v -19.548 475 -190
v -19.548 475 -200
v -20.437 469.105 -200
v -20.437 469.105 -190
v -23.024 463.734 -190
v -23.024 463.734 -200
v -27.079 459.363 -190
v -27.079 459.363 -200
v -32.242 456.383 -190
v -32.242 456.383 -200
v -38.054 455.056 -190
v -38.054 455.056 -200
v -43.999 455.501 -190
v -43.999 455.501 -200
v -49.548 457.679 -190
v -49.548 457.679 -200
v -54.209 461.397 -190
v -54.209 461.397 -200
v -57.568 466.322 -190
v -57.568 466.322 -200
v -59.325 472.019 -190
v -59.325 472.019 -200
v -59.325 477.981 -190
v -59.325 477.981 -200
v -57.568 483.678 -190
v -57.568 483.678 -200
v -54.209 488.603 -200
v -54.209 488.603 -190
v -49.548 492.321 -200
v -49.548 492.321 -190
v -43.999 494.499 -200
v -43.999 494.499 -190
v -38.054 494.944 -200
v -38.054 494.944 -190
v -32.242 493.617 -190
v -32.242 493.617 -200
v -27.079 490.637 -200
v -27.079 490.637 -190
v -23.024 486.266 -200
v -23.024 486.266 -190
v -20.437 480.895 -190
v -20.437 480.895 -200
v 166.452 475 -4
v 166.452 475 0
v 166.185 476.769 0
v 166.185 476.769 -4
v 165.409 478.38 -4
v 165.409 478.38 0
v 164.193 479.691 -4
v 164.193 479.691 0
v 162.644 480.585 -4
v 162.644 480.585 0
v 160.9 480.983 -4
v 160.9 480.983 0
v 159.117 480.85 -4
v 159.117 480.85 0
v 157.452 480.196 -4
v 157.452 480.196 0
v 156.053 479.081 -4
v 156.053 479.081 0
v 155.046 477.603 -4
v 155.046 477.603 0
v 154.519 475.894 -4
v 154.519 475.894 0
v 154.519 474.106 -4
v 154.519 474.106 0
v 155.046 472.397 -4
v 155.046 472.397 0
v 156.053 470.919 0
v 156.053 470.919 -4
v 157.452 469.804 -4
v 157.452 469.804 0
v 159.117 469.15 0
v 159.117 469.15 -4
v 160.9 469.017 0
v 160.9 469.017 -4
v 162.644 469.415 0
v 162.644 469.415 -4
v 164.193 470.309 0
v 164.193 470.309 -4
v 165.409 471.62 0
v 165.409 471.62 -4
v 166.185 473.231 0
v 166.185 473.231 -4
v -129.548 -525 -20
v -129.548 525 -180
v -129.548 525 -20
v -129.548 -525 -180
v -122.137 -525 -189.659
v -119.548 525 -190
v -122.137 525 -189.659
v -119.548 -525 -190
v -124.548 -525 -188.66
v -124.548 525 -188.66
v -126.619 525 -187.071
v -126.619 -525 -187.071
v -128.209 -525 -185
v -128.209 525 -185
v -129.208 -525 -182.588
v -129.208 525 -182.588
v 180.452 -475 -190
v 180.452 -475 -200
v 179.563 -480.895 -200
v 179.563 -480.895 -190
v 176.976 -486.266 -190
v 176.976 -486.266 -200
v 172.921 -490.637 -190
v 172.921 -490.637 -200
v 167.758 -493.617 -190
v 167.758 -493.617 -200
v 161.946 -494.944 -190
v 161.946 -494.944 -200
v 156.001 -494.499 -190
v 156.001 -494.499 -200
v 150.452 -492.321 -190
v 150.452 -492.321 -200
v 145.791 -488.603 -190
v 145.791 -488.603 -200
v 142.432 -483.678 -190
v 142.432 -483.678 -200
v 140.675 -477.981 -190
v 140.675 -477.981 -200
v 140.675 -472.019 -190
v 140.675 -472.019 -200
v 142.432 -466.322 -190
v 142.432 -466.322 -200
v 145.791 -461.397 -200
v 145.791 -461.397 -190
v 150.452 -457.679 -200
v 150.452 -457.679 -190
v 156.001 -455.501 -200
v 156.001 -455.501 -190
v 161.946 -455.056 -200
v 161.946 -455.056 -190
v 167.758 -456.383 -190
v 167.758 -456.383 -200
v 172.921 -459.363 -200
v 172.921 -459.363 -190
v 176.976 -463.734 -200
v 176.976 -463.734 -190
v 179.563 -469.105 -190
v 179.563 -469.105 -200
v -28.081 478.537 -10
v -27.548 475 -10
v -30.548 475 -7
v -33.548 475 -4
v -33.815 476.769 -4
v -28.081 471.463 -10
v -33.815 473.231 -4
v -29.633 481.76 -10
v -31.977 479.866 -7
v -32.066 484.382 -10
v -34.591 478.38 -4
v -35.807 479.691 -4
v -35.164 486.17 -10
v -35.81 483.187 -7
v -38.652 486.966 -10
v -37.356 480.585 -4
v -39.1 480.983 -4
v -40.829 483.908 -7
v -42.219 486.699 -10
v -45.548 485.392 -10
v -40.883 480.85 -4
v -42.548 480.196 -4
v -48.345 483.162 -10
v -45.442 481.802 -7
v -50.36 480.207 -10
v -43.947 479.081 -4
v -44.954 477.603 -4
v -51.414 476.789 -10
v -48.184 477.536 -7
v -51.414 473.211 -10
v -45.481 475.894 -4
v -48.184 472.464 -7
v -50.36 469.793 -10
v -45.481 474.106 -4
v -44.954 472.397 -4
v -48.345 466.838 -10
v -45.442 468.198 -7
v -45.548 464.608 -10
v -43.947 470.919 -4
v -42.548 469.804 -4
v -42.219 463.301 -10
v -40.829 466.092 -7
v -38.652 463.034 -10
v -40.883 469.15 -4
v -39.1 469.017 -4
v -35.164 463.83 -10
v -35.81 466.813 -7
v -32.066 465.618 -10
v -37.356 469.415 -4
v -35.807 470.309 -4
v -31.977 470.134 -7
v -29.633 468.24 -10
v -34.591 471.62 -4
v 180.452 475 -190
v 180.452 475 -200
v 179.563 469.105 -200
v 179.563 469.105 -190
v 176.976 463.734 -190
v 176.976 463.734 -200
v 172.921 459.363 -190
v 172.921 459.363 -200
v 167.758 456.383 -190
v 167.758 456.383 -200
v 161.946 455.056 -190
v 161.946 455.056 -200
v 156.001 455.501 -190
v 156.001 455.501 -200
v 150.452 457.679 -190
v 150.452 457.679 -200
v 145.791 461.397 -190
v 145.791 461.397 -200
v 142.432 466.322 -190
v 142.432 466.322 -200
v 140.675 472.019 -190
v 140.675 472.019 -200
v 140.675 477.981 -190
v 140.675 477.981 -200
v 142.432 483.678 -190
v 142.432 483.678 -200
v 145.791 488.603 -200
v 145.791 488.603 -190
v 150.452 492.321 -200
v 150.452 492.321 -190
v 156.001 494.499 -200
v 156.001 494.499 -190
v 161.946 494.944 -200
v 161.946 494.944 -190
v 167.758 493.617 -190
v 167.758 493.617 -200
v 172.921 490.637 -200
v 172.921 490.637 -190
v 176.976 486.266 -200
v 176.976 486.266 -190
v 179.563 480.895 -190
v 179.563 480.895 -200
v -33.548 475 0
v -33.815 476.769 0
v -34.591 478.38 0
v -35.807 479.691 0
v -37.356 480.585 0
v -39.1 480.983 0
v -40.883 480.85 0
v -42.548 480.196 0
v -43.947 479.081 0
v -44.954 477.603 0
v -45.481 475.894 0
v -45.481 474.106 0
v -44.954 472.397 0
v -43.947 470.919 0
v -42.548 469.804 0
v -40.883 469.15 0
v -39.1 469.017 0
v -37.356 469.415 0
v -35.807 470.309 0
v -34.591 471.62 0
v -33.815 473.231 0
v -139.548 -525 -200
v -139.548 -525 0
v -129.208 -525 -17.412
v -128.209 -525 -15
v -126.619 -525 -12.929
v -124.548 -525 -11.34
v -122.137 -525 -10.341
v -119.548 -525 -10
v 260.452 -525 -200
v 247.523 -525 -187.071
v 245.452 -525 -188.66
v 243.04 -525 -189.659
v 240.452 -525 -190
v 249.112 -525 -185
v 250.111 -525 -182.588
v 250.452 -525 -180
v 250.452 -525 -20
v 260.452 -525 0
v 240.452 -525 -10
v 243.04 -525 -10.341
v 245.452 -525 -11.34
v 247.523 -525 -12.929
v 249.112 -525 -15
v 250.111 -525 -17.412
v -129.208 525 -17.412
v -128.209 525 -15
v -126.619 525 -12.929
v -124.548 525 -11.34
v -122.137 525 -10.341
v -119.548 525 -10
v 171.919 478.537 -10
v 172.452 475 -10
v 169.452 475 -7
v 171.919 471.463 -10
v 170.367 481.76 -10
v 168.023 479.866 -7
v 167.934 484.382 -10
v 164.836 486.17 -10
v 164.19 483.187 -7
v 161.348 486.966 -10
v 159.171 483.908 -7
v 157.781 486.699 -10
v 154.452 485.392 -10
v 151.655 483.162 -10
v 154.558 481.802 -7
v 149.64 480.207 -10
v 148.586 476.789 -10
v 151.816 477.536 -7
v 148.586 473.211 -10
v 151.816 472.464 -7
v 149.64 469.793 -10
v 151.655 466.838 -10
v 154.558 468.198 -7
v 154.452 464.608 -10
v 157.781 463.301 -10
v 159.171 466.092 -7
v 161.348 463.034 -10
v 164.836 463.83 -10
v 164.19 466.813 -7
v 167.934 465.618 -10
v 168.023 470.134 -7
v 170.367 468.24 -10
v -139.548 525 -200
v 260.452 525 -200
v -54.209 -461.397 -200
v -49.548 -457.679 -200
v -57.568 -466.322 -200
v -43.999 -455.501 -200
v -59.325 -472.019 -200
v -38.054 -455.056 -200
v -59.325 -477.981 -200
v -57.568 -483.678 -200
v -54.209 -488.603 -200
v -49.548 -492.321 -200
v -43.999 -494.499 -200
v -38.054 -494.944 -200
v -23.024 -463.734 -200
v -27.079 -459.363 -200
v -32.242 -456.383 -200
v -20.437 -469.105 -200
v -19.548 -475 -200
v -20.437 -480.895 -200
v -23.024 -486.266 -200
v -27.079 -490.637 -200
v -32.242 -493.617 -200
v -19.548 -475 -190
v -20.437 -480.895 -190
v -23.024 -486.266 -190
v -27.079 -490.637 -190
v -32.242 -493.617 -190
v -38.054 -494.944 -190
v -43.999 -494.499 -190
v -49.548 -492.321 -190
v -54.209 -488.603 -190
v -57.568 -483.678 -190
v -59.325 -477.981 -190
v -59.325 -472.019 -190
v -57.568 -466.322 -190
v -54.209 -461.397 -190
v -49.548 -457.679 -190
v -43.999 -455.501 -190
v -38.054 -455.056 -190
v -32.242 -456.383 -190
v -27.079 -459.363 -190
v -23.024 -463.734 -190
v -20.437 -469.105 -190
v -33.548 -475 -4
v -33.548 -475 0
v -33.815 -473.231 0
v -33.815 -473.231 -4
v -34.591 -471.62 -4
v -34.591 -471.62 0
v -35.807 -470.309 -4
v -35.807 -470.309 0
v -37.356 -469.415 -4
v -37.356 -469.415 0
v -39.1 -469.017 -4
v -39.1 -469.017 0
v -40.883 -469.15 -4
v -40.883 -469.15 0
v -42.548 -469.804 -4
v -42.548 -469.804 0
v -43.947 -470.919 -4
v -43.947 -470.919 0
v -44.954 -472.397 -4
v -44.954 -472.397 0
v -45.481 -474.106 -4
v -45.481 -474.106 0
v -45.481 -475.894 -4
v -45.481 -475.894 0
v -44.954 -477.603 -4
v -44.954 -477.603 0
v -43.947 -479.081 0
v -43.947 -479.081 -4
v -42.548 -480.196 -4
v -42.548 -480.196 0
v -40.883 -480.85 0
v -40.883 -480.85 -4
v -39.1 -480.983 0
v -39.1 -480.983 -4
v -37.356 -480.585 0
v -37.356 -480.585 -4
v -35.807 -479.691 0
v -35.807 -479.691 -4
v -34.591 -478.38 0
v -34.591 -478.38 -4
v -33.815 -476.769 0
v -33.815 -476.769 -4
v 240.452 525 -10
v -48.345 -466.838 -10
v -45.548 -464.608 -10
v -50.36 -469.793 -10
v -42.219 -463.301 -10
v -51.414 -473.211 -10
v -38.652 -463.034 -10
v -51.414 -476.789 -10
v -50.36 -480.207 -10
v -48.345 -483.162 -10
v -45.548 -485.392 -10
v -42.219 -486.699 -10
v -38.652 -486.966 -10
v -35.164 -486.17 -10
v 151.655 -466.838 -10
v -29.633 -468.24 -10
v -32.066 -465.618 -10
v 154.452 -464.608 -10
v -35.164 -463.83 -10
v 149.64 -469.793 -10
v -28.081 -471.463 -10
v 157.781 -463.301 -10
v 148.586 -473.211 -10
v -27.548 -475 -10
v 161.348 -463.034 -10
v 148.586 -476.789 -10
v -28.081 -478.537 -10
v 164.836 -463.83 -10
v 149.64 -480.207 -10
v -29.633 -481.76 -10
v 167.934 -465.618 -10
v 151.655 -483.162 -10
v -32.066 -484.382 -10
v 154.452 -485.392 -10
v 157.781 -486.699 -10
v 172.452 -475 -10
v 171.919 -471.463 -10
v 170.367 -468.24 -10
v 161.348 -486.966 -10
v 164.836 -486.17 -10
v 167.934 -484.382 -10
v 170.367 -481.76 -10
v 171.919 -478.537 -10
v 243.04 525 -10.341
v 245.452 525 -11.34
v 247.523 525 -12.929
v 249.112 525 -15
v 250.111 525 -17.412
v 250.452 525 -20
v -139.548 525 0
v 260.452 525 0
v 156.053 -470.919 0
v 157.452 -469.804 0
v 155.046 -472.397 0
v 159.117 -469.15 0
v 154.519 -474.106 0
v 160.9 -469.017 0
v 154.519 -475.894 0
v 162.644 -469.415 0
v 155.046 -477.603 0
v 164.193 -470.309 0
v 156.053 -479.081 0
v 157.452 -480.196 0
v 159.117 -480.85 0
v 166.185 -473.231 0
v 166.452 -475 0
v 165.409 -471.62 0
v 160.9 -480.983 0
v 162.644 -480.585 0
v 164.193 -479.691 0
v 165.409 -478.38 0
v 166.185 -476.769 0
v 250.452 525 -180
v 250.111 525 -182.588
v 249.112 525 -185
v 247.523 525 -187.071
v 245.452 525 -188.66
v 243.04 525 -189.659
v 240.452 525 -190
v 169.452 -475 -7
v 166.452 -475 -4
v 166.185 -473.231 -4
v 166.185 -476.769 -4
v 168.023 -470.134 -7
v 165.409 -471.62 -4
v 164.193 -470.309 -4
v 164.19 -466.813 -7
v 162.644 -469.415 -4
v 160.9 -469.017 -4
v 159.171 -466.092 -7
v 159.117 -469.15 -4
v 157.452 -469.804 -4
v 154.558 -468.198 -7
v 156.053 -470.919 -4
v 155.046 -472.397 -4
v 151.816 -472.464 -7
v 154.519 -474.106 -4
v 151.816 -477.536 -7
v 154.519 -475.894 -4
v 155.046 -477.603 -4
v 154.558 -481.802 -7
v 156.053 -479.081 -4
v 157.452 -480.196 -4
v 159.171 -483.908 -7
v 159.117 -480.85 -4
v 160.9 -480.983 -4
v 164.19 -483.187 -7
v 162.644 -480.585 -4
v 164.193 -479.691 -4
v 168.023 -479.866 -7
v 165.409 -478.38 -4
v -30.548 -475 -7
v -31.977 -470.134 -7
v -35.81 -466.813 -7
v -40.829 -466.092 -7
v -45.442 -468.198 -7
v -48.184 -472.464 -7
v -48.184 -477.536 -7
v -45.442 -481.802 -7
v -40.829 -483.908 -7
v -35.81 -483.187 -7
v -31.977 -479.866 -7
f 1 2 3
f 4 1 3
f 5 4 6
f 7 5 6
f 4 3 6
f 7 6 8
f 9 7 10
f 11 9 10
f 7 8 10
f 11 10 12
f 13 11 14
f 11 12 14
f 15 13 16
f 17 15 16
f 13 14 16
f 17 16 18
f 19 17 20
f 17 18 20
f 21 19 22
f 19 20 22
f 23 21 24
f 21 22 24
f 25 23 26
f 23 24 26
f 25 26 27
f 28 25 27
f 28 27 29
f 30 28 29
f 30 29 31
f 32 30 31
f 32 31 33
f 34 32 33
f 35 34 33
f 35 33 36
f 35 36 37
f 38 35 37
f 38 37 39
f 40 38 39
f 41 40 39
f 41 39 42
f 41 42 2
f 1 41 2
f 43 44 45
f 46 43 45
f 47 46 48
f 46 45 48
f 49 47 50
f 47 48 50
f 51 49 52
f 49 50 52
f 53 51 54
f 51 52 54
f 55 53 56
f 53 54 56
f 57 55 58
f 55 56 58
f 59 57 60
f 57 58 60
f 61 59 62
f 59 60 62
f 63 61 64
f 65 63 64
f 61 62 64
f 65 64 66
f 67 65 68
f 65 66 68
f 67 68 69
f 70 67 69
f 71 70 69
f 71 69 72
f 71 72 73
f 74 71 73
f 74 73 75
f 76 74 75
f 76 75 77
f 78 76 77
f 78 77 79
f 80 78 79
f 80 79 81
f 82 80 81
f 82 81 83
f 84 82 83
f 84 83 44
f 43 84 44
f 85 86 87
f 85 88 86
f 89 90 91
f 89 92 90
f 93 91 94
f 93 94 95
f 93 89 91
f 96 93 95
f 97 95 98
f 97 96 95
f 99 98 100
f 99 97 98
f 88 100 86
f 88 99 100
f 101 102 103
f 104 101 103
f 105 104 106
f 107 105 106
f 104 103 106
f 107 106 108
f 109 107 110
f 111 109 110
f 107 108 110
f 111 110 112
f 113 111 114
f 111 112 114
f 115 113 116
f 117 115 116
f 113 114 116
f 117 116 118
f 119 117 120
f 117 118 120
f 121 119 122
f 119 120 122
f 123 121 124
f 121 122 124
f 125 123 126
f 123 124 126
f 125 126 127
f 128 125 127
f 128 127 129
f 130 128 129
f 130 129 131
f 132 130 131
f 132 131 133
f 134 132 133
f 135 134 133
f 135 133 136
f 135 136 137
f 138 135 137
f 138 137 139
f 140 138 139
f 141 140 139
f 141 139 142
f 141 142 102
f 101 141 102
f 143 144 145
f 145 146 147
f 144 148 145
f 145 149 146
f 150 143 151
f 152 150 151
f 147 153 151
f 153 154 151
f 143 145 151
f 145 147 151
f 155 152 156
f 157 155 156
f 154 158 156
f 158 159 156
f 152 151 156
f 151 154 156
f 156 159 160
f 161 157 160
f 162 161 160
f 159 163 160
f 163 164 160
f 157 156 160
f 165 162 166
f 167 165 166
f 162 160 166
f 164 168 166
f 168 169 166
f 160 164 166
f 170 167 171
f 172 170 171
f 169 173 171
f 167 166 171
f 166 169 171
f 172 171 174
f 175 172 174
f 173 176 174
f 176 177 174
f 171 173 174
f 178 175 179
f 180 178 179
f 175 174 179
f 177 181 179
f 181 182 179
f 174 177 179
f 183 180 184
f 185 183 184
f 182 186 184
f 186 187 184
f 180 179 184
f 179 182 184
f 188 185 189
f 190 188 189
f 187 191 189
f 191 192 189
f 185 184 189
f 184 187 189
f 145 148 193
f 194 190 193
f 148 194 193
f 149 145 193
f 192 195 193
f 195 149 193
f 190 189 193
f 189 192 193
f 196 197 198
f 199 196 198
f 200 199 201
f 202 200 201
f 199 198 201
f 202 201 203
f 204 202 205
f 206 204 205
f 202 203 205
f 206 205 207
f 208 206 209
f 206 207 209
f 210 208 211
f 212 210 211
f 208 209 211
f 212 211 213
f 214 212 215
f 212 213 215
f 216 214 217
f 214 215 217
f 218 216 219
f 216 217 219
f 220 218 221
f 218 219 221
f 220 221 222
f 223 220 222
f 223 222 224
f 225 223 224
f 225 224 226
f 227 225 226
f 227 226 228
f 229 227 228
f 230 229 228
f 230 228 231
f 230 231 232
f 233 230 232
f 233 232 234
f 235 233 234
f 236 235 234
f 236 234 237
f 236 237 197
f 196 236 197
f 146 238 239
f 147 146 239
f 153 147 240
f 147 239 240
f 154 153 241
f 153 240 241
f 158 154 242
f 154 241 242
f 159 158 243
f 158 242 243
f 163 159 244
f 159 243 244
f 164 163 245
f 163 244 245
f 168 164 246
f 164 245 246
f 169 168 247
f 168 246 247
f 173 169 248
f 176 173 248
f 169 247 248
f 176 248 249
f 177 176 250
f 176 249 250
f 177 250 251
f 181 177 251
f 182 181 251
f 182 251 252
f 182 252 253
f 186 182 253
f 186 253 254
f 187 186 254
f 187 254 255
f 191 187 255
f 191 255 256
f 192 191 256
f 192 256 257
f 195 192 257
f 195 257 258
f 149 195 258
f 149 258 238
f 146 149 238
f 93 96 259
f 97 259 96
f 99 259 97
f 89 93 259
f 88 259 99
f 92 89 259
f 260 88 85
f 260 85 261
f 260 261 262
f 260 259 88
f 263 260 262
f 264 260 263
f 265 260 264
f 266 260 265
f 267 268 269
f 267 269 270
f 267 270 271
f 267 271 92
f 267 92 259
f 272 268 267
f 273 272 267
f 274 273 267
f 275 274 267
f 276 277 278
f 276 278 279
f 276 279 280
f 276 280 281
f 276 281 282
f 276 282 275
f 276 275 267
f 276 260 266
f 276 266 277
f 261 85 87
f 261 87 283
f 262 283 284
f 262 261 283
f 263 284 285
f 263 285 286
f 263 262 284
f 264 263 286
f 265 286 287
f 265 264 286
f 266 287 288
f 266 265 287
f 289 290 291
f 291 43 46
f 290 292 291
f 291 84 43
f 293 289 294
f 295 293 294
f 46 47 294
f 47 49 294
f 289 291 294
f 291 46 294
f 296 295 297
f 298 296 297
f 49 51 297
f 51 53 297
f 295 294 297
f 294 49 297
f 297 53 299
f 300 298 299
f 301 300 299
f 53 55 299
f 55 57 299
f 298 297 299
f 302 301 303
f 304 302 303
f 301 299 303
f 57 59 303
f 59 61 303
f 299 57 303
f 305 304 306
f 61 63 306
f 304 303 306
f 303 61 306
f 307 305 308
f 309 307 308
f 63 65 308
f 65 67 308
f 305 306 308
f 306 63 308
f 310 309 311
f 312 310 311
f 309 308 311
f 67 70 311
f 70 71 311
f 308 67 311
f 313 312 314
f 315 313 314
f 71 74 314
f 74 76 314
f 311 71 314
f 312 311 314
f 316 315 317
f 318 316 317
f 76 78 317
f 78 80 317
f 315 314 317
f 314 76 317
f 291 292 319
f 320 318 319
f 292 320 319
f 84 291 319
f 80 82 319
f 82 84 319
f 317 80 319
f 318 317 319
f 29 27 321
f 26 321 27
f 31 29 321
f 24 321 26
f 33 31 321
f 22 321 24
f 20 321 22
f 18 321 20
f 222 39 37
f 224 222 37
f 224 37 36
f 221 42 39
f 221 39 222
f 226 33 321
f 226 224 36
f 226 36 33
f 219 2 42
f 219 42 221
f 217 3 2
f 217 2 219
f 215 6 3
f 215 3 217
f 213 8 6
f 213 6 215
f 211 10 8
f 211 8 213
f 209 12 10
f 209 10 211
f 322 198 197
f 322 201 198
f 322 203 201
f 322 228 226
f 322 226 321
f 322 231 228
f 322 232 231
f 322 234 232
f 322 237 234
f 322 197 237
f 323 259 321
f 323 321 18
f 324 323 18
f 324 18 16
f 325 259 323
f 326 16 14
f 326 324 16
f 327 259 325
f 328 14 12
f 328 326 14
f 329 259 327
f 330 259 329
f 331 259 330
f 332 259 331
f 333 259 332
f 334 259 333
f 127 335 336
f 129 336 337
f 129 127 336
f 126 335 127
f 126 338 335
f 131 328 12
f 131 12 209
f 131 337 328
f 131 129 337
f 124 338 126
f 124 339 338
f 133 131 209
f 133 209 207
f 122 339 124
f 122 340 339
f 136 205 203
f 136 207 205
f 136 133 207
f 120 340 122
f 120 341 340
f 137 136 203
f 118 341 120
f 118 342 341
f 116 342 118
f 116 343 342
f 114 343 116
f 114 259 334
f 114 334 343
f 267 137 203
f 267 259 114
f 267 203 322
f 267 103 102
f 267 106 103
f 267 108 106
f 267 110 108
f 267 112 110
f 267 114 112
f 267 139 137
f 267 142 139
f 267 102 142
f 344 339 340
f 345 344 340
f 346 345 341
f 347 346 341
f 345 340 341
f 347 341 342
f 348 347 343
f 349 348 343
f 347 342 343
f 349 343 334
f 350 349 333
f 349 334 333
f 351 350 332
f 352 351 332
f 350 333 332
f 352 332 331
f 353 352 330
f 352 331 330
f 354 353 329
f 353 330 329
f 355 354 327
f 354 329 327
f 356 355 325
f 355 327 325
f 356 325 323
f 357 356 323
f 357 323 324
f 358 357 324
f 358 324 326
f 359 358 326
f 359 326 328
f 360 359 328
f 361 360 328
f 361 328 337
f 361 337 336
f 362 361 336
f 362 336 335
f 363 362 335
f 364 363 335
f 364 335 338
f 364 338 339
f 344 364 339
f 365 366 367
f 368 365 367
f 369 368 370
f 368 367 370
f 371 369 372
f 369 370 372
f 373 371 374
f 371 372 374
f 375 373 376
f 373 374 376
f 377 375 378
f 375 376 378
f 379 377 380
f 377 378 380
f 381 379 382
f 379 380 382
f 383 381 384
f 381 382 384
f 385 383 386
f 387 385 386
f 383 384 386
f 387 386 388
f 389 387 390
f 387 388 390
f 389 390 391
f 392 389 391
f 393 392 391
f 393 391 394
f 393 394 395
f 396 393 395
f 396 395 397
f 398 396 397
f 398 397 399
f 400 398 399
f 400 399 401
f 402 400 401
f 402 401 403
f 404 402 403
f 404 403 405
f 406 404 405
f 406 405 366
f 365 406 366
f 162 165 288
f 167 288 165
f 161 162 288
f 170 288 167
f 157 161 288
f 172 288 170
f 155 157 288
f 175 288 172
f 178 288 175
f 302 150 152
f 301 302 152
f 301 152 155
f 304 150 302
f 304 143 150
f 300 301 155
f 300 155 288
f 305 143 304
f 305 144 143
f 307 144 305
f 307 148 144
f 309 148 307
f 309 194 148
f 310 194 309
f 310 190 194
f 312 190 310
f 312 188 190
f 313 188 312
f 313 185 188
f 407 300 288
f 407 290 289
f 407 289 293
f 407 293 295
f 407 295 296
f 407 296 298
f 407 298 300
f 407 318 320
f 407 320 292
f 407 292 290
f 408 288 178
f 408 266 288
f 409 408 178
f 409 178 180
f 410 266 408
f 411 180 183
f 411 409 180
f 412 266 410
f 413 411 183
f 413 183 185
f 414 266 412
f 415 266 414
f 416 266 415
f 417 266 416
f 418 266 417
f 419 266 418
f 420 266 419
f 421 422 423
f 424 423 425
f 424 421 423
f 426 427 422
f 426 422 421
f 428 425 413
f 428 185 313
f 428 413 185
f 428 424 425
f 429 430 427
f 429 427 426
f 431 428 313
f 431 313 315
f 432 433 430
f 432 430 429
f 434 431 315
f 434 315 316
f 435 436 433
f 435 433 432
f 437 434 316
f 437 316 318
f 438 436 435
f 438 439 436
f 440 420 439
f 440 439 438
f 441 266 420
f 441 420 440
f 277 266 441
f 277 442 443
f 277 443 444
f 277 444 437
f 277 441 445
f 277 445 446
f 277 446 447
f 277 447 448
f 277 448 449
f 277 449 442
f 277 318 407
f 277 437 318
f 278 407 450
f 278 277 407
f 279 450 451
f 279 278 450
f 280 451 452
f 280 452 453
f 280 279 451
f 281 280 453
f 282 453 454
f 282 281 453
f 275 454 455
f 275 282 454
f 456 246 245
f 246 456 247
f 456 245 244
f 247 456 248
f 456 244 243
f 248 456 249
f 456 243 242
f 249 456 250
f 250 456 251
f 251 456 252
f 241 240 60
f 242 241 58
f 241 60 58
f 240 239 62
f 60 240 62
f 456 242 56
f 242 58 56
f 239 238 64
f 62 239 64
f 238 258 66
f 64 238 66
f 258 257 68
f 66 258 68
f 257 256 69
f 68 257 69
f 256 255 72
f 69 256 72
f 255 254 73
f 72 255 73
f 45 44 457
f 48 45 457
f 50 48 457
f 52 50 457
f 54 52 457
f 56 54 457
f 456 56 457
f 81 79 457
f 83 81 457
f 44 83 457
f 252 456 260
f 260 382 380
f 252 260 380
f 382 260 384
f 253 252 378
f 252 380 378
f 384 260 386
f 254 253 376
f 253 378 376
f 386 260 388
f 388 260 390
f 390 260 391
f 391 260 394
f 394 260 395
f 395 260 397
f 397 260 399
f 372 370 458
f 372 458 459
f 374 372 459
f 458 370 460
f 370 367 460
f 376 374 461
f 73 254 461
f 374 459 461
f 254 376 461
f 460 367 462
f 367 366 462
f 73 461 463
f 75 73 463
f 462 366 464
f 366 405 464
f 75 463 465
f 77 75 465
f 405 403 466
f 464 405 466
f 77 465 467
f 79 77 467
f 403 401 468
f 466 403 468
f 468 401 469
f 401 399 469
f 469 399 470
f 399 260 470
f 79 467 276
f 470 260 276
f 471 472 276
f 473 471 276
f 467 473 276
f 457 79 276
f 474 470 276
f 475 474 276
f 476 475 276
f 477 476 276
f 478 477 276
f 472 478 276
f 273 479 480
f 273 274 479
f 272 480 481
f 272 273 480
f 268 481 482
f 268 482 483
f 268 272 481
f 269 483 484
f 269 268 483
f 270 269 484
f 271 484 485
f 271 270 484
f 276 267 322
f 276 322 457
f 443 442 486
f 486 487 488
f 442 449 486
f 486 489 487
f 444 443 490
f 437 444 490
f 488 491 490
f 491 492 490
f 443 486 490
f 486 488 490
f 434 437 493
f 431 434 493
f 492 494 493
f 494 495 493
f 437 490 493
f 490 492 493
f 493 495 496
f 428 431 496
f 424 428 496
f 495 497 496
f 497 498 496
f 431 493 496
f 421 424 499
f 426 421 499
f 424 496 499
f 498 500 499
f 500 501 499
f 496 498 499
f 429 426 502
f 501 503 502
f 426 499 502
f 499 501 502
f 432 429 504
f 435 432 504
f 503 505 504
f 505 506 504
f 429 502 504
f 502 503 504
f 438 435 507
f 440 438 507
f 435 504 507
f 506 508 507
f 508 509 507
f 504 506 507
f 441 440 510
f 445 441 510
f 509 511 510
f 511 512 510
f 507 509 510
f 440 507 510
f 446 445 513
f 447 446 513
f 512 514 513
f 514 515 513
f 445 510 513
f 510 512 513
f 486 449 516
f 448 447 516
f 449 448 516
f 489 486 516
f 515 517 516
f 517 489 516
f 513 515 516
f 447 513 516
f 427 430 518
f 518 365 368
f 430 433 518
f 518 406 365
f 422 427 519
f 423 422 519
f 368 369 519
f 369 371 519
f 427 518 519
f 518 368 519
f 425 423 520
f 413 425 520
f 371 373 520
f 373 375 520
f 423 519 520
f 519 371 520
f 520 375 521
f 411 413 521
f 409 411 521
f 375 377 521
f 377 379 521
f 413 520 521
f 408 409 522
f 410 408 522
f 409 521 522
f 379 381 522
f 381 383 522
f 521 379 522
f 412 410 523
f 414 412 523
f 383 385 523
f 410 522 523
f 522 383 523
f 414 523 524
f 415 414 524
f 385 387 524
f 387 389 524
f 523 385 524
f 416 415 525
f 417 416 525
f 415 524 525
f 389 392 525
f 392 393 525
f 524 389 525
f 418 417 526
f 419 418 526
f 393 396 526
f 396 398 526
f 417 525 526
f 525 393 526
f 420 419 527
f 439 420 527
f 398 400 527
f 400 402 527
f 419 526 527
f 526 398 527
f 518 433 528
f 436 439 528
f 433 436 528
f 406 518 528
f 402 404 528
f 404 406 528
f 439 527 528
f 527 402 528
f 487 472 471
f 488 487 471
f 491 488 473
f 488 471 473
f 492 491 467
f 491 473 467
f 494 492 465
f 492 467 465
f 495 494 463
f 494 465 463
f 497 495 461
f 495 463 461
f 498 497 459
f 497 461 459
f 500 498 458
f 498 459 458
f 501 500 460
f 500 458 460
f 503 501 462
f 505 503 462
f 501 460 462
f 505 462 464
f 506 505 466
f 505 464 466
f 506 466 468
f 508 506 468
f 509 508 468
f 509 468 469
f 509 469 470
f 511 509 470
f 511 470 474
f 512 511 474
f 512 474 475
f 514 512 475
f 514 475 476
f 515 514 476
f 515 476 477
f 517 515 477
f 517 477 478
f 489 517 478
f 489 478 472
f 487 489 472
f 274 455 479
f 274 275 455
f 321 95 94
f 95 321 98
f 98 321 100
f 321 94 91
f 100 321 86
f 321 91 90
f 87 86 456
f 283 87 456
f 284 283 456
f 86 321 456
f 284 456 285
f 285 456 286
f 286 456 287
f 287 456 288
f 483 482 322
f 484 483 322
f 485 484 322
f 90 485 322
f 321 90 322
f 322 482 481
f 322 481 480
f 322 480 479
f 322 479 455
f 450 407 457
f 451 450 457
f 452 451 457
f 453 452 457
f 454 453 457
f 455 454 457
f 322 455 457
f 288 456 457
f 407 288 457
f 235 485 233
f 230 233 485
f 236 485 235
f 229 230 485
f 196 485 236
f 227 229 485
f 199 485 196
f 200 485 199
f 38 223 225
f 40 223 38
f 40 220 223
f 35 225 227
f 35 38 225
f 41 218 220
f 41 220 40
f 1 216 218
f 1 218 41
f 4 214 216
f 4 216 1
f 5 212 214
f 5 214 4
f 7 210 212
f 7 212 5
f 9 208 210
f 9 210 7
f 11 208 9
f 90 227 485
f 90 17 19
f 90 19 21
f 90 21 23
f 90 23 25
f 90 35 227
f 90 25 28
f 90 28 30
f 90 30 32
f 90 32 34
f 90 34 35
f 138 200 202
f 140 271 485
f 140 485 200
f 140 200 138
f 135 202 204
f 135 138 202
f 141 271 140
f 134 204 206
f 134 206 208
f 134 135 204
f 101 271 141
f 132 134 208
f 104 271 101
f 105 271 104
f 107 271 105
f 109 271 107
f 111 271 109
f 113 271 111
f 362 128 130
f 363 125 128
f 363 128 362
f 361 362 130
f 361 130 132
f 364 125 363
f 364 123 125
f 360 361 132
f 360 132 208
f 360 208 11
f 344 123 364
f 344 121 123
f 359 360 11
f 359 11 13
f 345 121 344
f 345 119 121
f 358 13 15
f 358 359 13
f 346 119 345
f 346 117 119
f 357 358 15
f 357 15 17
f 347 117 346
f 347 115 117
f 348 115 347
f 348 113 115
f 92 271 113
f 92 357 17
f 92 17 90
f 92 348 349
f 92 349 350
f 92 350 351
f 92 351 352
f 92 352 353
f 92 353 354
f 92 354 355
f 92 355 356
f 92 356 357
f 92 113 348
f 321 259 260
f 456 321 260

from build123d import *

# Parameters (mm, degrees)
F0_W     = 400
F0_H     = 200
F1_DEPTH = 525
F2_R     = 6
F3_DEPTH = 200.001
F4_R     = 20
F5_DEPTH = 25
F6_SIZE  = 6


with BuildPart() as f1:
    # F0 (on Front) → F1 (new body, symmetric)
    with BuildSketch(Plane.XZ):
        with Locations((60.4516596433, -100)):
            Rectangle(F0_W, F0_H)
        with BuildLine():
            ThreePointArc((-129.5483403567, -20), (-126.6194081686, -12.9289321881), (-119.5483403567, -10))
            Line((-119.5483403567, -10), (240.4516596433, -10))
            ThreePointArc((240.4516596433, -10), (247.5227274551, -12.9289321881), (250.4516596433, -20))
            Line((250.4516596433, -20), (250.4516596433, -180))
            ThreePointArc((250.4516596433, -180), (247.5227274551, -187.0710678119), (240.4516596433, -190))
            Line((240.4516596433, -190), (-119.5483403567, -190))
            ThreePointArc((-119.5483403567, -190), (-126.6194081686, -187.0710678119), (-129.5483403567, -180))
            Line((-129.5483403567, -180), (-129.5483403567, -20))
        make_face(mode=Mode.SUBTRACT)
    extrude(amount=F1_DEPTH, both=True)

    # F2 (on face) → F3 (cut, through all)
    with BuildSketch(Plane.XY):
        with Locations((-39.5483403567, -475)):
            Circle(F2_R)
        with Locations((160.4516596433, -475)):
            Circle(F2_R)
        with Locations((-39.5483403567, 475)):
            Circle(F2_R)
        with Locations((160.4516596433, 475)):
            Circle(F2_R)
    extrude(amount=-F3_DEPTH, mode=Mode.SUBTRACT)

    # F4 (on face) → F5 (cut)
    with BuildSketch(Plane(origin=(0, 0, -200), x_dir=(1, 0, 0), z_dir=(0, 0, -1))):
        with Locations((-39.5483403567, 475)):
            Circle(F4_R)
        with Locations((160.4516596433, 475)):
            Circle(F4_R)
        with Locations((-39.5483403567, -475)):
            Circle(F4_R)
        with Locations((160.4516596433, -475)):
            Circle(F4_R)
    extrude(amount=-F5_DEPTH, mode=Mode.SUBTRACT)

    # F6
    f6_edges = [f1.edges().sort_by_distance(p)[0] for p in [
        (-45.54834, -475, -10),
        (154.45166, -475, -10),
        (-45.54834, 475, -10),
        (154.45166, 475, -10),
    ]]
    chamfer(f6_edges, length=F6_SIZE)


solid = f1.part
